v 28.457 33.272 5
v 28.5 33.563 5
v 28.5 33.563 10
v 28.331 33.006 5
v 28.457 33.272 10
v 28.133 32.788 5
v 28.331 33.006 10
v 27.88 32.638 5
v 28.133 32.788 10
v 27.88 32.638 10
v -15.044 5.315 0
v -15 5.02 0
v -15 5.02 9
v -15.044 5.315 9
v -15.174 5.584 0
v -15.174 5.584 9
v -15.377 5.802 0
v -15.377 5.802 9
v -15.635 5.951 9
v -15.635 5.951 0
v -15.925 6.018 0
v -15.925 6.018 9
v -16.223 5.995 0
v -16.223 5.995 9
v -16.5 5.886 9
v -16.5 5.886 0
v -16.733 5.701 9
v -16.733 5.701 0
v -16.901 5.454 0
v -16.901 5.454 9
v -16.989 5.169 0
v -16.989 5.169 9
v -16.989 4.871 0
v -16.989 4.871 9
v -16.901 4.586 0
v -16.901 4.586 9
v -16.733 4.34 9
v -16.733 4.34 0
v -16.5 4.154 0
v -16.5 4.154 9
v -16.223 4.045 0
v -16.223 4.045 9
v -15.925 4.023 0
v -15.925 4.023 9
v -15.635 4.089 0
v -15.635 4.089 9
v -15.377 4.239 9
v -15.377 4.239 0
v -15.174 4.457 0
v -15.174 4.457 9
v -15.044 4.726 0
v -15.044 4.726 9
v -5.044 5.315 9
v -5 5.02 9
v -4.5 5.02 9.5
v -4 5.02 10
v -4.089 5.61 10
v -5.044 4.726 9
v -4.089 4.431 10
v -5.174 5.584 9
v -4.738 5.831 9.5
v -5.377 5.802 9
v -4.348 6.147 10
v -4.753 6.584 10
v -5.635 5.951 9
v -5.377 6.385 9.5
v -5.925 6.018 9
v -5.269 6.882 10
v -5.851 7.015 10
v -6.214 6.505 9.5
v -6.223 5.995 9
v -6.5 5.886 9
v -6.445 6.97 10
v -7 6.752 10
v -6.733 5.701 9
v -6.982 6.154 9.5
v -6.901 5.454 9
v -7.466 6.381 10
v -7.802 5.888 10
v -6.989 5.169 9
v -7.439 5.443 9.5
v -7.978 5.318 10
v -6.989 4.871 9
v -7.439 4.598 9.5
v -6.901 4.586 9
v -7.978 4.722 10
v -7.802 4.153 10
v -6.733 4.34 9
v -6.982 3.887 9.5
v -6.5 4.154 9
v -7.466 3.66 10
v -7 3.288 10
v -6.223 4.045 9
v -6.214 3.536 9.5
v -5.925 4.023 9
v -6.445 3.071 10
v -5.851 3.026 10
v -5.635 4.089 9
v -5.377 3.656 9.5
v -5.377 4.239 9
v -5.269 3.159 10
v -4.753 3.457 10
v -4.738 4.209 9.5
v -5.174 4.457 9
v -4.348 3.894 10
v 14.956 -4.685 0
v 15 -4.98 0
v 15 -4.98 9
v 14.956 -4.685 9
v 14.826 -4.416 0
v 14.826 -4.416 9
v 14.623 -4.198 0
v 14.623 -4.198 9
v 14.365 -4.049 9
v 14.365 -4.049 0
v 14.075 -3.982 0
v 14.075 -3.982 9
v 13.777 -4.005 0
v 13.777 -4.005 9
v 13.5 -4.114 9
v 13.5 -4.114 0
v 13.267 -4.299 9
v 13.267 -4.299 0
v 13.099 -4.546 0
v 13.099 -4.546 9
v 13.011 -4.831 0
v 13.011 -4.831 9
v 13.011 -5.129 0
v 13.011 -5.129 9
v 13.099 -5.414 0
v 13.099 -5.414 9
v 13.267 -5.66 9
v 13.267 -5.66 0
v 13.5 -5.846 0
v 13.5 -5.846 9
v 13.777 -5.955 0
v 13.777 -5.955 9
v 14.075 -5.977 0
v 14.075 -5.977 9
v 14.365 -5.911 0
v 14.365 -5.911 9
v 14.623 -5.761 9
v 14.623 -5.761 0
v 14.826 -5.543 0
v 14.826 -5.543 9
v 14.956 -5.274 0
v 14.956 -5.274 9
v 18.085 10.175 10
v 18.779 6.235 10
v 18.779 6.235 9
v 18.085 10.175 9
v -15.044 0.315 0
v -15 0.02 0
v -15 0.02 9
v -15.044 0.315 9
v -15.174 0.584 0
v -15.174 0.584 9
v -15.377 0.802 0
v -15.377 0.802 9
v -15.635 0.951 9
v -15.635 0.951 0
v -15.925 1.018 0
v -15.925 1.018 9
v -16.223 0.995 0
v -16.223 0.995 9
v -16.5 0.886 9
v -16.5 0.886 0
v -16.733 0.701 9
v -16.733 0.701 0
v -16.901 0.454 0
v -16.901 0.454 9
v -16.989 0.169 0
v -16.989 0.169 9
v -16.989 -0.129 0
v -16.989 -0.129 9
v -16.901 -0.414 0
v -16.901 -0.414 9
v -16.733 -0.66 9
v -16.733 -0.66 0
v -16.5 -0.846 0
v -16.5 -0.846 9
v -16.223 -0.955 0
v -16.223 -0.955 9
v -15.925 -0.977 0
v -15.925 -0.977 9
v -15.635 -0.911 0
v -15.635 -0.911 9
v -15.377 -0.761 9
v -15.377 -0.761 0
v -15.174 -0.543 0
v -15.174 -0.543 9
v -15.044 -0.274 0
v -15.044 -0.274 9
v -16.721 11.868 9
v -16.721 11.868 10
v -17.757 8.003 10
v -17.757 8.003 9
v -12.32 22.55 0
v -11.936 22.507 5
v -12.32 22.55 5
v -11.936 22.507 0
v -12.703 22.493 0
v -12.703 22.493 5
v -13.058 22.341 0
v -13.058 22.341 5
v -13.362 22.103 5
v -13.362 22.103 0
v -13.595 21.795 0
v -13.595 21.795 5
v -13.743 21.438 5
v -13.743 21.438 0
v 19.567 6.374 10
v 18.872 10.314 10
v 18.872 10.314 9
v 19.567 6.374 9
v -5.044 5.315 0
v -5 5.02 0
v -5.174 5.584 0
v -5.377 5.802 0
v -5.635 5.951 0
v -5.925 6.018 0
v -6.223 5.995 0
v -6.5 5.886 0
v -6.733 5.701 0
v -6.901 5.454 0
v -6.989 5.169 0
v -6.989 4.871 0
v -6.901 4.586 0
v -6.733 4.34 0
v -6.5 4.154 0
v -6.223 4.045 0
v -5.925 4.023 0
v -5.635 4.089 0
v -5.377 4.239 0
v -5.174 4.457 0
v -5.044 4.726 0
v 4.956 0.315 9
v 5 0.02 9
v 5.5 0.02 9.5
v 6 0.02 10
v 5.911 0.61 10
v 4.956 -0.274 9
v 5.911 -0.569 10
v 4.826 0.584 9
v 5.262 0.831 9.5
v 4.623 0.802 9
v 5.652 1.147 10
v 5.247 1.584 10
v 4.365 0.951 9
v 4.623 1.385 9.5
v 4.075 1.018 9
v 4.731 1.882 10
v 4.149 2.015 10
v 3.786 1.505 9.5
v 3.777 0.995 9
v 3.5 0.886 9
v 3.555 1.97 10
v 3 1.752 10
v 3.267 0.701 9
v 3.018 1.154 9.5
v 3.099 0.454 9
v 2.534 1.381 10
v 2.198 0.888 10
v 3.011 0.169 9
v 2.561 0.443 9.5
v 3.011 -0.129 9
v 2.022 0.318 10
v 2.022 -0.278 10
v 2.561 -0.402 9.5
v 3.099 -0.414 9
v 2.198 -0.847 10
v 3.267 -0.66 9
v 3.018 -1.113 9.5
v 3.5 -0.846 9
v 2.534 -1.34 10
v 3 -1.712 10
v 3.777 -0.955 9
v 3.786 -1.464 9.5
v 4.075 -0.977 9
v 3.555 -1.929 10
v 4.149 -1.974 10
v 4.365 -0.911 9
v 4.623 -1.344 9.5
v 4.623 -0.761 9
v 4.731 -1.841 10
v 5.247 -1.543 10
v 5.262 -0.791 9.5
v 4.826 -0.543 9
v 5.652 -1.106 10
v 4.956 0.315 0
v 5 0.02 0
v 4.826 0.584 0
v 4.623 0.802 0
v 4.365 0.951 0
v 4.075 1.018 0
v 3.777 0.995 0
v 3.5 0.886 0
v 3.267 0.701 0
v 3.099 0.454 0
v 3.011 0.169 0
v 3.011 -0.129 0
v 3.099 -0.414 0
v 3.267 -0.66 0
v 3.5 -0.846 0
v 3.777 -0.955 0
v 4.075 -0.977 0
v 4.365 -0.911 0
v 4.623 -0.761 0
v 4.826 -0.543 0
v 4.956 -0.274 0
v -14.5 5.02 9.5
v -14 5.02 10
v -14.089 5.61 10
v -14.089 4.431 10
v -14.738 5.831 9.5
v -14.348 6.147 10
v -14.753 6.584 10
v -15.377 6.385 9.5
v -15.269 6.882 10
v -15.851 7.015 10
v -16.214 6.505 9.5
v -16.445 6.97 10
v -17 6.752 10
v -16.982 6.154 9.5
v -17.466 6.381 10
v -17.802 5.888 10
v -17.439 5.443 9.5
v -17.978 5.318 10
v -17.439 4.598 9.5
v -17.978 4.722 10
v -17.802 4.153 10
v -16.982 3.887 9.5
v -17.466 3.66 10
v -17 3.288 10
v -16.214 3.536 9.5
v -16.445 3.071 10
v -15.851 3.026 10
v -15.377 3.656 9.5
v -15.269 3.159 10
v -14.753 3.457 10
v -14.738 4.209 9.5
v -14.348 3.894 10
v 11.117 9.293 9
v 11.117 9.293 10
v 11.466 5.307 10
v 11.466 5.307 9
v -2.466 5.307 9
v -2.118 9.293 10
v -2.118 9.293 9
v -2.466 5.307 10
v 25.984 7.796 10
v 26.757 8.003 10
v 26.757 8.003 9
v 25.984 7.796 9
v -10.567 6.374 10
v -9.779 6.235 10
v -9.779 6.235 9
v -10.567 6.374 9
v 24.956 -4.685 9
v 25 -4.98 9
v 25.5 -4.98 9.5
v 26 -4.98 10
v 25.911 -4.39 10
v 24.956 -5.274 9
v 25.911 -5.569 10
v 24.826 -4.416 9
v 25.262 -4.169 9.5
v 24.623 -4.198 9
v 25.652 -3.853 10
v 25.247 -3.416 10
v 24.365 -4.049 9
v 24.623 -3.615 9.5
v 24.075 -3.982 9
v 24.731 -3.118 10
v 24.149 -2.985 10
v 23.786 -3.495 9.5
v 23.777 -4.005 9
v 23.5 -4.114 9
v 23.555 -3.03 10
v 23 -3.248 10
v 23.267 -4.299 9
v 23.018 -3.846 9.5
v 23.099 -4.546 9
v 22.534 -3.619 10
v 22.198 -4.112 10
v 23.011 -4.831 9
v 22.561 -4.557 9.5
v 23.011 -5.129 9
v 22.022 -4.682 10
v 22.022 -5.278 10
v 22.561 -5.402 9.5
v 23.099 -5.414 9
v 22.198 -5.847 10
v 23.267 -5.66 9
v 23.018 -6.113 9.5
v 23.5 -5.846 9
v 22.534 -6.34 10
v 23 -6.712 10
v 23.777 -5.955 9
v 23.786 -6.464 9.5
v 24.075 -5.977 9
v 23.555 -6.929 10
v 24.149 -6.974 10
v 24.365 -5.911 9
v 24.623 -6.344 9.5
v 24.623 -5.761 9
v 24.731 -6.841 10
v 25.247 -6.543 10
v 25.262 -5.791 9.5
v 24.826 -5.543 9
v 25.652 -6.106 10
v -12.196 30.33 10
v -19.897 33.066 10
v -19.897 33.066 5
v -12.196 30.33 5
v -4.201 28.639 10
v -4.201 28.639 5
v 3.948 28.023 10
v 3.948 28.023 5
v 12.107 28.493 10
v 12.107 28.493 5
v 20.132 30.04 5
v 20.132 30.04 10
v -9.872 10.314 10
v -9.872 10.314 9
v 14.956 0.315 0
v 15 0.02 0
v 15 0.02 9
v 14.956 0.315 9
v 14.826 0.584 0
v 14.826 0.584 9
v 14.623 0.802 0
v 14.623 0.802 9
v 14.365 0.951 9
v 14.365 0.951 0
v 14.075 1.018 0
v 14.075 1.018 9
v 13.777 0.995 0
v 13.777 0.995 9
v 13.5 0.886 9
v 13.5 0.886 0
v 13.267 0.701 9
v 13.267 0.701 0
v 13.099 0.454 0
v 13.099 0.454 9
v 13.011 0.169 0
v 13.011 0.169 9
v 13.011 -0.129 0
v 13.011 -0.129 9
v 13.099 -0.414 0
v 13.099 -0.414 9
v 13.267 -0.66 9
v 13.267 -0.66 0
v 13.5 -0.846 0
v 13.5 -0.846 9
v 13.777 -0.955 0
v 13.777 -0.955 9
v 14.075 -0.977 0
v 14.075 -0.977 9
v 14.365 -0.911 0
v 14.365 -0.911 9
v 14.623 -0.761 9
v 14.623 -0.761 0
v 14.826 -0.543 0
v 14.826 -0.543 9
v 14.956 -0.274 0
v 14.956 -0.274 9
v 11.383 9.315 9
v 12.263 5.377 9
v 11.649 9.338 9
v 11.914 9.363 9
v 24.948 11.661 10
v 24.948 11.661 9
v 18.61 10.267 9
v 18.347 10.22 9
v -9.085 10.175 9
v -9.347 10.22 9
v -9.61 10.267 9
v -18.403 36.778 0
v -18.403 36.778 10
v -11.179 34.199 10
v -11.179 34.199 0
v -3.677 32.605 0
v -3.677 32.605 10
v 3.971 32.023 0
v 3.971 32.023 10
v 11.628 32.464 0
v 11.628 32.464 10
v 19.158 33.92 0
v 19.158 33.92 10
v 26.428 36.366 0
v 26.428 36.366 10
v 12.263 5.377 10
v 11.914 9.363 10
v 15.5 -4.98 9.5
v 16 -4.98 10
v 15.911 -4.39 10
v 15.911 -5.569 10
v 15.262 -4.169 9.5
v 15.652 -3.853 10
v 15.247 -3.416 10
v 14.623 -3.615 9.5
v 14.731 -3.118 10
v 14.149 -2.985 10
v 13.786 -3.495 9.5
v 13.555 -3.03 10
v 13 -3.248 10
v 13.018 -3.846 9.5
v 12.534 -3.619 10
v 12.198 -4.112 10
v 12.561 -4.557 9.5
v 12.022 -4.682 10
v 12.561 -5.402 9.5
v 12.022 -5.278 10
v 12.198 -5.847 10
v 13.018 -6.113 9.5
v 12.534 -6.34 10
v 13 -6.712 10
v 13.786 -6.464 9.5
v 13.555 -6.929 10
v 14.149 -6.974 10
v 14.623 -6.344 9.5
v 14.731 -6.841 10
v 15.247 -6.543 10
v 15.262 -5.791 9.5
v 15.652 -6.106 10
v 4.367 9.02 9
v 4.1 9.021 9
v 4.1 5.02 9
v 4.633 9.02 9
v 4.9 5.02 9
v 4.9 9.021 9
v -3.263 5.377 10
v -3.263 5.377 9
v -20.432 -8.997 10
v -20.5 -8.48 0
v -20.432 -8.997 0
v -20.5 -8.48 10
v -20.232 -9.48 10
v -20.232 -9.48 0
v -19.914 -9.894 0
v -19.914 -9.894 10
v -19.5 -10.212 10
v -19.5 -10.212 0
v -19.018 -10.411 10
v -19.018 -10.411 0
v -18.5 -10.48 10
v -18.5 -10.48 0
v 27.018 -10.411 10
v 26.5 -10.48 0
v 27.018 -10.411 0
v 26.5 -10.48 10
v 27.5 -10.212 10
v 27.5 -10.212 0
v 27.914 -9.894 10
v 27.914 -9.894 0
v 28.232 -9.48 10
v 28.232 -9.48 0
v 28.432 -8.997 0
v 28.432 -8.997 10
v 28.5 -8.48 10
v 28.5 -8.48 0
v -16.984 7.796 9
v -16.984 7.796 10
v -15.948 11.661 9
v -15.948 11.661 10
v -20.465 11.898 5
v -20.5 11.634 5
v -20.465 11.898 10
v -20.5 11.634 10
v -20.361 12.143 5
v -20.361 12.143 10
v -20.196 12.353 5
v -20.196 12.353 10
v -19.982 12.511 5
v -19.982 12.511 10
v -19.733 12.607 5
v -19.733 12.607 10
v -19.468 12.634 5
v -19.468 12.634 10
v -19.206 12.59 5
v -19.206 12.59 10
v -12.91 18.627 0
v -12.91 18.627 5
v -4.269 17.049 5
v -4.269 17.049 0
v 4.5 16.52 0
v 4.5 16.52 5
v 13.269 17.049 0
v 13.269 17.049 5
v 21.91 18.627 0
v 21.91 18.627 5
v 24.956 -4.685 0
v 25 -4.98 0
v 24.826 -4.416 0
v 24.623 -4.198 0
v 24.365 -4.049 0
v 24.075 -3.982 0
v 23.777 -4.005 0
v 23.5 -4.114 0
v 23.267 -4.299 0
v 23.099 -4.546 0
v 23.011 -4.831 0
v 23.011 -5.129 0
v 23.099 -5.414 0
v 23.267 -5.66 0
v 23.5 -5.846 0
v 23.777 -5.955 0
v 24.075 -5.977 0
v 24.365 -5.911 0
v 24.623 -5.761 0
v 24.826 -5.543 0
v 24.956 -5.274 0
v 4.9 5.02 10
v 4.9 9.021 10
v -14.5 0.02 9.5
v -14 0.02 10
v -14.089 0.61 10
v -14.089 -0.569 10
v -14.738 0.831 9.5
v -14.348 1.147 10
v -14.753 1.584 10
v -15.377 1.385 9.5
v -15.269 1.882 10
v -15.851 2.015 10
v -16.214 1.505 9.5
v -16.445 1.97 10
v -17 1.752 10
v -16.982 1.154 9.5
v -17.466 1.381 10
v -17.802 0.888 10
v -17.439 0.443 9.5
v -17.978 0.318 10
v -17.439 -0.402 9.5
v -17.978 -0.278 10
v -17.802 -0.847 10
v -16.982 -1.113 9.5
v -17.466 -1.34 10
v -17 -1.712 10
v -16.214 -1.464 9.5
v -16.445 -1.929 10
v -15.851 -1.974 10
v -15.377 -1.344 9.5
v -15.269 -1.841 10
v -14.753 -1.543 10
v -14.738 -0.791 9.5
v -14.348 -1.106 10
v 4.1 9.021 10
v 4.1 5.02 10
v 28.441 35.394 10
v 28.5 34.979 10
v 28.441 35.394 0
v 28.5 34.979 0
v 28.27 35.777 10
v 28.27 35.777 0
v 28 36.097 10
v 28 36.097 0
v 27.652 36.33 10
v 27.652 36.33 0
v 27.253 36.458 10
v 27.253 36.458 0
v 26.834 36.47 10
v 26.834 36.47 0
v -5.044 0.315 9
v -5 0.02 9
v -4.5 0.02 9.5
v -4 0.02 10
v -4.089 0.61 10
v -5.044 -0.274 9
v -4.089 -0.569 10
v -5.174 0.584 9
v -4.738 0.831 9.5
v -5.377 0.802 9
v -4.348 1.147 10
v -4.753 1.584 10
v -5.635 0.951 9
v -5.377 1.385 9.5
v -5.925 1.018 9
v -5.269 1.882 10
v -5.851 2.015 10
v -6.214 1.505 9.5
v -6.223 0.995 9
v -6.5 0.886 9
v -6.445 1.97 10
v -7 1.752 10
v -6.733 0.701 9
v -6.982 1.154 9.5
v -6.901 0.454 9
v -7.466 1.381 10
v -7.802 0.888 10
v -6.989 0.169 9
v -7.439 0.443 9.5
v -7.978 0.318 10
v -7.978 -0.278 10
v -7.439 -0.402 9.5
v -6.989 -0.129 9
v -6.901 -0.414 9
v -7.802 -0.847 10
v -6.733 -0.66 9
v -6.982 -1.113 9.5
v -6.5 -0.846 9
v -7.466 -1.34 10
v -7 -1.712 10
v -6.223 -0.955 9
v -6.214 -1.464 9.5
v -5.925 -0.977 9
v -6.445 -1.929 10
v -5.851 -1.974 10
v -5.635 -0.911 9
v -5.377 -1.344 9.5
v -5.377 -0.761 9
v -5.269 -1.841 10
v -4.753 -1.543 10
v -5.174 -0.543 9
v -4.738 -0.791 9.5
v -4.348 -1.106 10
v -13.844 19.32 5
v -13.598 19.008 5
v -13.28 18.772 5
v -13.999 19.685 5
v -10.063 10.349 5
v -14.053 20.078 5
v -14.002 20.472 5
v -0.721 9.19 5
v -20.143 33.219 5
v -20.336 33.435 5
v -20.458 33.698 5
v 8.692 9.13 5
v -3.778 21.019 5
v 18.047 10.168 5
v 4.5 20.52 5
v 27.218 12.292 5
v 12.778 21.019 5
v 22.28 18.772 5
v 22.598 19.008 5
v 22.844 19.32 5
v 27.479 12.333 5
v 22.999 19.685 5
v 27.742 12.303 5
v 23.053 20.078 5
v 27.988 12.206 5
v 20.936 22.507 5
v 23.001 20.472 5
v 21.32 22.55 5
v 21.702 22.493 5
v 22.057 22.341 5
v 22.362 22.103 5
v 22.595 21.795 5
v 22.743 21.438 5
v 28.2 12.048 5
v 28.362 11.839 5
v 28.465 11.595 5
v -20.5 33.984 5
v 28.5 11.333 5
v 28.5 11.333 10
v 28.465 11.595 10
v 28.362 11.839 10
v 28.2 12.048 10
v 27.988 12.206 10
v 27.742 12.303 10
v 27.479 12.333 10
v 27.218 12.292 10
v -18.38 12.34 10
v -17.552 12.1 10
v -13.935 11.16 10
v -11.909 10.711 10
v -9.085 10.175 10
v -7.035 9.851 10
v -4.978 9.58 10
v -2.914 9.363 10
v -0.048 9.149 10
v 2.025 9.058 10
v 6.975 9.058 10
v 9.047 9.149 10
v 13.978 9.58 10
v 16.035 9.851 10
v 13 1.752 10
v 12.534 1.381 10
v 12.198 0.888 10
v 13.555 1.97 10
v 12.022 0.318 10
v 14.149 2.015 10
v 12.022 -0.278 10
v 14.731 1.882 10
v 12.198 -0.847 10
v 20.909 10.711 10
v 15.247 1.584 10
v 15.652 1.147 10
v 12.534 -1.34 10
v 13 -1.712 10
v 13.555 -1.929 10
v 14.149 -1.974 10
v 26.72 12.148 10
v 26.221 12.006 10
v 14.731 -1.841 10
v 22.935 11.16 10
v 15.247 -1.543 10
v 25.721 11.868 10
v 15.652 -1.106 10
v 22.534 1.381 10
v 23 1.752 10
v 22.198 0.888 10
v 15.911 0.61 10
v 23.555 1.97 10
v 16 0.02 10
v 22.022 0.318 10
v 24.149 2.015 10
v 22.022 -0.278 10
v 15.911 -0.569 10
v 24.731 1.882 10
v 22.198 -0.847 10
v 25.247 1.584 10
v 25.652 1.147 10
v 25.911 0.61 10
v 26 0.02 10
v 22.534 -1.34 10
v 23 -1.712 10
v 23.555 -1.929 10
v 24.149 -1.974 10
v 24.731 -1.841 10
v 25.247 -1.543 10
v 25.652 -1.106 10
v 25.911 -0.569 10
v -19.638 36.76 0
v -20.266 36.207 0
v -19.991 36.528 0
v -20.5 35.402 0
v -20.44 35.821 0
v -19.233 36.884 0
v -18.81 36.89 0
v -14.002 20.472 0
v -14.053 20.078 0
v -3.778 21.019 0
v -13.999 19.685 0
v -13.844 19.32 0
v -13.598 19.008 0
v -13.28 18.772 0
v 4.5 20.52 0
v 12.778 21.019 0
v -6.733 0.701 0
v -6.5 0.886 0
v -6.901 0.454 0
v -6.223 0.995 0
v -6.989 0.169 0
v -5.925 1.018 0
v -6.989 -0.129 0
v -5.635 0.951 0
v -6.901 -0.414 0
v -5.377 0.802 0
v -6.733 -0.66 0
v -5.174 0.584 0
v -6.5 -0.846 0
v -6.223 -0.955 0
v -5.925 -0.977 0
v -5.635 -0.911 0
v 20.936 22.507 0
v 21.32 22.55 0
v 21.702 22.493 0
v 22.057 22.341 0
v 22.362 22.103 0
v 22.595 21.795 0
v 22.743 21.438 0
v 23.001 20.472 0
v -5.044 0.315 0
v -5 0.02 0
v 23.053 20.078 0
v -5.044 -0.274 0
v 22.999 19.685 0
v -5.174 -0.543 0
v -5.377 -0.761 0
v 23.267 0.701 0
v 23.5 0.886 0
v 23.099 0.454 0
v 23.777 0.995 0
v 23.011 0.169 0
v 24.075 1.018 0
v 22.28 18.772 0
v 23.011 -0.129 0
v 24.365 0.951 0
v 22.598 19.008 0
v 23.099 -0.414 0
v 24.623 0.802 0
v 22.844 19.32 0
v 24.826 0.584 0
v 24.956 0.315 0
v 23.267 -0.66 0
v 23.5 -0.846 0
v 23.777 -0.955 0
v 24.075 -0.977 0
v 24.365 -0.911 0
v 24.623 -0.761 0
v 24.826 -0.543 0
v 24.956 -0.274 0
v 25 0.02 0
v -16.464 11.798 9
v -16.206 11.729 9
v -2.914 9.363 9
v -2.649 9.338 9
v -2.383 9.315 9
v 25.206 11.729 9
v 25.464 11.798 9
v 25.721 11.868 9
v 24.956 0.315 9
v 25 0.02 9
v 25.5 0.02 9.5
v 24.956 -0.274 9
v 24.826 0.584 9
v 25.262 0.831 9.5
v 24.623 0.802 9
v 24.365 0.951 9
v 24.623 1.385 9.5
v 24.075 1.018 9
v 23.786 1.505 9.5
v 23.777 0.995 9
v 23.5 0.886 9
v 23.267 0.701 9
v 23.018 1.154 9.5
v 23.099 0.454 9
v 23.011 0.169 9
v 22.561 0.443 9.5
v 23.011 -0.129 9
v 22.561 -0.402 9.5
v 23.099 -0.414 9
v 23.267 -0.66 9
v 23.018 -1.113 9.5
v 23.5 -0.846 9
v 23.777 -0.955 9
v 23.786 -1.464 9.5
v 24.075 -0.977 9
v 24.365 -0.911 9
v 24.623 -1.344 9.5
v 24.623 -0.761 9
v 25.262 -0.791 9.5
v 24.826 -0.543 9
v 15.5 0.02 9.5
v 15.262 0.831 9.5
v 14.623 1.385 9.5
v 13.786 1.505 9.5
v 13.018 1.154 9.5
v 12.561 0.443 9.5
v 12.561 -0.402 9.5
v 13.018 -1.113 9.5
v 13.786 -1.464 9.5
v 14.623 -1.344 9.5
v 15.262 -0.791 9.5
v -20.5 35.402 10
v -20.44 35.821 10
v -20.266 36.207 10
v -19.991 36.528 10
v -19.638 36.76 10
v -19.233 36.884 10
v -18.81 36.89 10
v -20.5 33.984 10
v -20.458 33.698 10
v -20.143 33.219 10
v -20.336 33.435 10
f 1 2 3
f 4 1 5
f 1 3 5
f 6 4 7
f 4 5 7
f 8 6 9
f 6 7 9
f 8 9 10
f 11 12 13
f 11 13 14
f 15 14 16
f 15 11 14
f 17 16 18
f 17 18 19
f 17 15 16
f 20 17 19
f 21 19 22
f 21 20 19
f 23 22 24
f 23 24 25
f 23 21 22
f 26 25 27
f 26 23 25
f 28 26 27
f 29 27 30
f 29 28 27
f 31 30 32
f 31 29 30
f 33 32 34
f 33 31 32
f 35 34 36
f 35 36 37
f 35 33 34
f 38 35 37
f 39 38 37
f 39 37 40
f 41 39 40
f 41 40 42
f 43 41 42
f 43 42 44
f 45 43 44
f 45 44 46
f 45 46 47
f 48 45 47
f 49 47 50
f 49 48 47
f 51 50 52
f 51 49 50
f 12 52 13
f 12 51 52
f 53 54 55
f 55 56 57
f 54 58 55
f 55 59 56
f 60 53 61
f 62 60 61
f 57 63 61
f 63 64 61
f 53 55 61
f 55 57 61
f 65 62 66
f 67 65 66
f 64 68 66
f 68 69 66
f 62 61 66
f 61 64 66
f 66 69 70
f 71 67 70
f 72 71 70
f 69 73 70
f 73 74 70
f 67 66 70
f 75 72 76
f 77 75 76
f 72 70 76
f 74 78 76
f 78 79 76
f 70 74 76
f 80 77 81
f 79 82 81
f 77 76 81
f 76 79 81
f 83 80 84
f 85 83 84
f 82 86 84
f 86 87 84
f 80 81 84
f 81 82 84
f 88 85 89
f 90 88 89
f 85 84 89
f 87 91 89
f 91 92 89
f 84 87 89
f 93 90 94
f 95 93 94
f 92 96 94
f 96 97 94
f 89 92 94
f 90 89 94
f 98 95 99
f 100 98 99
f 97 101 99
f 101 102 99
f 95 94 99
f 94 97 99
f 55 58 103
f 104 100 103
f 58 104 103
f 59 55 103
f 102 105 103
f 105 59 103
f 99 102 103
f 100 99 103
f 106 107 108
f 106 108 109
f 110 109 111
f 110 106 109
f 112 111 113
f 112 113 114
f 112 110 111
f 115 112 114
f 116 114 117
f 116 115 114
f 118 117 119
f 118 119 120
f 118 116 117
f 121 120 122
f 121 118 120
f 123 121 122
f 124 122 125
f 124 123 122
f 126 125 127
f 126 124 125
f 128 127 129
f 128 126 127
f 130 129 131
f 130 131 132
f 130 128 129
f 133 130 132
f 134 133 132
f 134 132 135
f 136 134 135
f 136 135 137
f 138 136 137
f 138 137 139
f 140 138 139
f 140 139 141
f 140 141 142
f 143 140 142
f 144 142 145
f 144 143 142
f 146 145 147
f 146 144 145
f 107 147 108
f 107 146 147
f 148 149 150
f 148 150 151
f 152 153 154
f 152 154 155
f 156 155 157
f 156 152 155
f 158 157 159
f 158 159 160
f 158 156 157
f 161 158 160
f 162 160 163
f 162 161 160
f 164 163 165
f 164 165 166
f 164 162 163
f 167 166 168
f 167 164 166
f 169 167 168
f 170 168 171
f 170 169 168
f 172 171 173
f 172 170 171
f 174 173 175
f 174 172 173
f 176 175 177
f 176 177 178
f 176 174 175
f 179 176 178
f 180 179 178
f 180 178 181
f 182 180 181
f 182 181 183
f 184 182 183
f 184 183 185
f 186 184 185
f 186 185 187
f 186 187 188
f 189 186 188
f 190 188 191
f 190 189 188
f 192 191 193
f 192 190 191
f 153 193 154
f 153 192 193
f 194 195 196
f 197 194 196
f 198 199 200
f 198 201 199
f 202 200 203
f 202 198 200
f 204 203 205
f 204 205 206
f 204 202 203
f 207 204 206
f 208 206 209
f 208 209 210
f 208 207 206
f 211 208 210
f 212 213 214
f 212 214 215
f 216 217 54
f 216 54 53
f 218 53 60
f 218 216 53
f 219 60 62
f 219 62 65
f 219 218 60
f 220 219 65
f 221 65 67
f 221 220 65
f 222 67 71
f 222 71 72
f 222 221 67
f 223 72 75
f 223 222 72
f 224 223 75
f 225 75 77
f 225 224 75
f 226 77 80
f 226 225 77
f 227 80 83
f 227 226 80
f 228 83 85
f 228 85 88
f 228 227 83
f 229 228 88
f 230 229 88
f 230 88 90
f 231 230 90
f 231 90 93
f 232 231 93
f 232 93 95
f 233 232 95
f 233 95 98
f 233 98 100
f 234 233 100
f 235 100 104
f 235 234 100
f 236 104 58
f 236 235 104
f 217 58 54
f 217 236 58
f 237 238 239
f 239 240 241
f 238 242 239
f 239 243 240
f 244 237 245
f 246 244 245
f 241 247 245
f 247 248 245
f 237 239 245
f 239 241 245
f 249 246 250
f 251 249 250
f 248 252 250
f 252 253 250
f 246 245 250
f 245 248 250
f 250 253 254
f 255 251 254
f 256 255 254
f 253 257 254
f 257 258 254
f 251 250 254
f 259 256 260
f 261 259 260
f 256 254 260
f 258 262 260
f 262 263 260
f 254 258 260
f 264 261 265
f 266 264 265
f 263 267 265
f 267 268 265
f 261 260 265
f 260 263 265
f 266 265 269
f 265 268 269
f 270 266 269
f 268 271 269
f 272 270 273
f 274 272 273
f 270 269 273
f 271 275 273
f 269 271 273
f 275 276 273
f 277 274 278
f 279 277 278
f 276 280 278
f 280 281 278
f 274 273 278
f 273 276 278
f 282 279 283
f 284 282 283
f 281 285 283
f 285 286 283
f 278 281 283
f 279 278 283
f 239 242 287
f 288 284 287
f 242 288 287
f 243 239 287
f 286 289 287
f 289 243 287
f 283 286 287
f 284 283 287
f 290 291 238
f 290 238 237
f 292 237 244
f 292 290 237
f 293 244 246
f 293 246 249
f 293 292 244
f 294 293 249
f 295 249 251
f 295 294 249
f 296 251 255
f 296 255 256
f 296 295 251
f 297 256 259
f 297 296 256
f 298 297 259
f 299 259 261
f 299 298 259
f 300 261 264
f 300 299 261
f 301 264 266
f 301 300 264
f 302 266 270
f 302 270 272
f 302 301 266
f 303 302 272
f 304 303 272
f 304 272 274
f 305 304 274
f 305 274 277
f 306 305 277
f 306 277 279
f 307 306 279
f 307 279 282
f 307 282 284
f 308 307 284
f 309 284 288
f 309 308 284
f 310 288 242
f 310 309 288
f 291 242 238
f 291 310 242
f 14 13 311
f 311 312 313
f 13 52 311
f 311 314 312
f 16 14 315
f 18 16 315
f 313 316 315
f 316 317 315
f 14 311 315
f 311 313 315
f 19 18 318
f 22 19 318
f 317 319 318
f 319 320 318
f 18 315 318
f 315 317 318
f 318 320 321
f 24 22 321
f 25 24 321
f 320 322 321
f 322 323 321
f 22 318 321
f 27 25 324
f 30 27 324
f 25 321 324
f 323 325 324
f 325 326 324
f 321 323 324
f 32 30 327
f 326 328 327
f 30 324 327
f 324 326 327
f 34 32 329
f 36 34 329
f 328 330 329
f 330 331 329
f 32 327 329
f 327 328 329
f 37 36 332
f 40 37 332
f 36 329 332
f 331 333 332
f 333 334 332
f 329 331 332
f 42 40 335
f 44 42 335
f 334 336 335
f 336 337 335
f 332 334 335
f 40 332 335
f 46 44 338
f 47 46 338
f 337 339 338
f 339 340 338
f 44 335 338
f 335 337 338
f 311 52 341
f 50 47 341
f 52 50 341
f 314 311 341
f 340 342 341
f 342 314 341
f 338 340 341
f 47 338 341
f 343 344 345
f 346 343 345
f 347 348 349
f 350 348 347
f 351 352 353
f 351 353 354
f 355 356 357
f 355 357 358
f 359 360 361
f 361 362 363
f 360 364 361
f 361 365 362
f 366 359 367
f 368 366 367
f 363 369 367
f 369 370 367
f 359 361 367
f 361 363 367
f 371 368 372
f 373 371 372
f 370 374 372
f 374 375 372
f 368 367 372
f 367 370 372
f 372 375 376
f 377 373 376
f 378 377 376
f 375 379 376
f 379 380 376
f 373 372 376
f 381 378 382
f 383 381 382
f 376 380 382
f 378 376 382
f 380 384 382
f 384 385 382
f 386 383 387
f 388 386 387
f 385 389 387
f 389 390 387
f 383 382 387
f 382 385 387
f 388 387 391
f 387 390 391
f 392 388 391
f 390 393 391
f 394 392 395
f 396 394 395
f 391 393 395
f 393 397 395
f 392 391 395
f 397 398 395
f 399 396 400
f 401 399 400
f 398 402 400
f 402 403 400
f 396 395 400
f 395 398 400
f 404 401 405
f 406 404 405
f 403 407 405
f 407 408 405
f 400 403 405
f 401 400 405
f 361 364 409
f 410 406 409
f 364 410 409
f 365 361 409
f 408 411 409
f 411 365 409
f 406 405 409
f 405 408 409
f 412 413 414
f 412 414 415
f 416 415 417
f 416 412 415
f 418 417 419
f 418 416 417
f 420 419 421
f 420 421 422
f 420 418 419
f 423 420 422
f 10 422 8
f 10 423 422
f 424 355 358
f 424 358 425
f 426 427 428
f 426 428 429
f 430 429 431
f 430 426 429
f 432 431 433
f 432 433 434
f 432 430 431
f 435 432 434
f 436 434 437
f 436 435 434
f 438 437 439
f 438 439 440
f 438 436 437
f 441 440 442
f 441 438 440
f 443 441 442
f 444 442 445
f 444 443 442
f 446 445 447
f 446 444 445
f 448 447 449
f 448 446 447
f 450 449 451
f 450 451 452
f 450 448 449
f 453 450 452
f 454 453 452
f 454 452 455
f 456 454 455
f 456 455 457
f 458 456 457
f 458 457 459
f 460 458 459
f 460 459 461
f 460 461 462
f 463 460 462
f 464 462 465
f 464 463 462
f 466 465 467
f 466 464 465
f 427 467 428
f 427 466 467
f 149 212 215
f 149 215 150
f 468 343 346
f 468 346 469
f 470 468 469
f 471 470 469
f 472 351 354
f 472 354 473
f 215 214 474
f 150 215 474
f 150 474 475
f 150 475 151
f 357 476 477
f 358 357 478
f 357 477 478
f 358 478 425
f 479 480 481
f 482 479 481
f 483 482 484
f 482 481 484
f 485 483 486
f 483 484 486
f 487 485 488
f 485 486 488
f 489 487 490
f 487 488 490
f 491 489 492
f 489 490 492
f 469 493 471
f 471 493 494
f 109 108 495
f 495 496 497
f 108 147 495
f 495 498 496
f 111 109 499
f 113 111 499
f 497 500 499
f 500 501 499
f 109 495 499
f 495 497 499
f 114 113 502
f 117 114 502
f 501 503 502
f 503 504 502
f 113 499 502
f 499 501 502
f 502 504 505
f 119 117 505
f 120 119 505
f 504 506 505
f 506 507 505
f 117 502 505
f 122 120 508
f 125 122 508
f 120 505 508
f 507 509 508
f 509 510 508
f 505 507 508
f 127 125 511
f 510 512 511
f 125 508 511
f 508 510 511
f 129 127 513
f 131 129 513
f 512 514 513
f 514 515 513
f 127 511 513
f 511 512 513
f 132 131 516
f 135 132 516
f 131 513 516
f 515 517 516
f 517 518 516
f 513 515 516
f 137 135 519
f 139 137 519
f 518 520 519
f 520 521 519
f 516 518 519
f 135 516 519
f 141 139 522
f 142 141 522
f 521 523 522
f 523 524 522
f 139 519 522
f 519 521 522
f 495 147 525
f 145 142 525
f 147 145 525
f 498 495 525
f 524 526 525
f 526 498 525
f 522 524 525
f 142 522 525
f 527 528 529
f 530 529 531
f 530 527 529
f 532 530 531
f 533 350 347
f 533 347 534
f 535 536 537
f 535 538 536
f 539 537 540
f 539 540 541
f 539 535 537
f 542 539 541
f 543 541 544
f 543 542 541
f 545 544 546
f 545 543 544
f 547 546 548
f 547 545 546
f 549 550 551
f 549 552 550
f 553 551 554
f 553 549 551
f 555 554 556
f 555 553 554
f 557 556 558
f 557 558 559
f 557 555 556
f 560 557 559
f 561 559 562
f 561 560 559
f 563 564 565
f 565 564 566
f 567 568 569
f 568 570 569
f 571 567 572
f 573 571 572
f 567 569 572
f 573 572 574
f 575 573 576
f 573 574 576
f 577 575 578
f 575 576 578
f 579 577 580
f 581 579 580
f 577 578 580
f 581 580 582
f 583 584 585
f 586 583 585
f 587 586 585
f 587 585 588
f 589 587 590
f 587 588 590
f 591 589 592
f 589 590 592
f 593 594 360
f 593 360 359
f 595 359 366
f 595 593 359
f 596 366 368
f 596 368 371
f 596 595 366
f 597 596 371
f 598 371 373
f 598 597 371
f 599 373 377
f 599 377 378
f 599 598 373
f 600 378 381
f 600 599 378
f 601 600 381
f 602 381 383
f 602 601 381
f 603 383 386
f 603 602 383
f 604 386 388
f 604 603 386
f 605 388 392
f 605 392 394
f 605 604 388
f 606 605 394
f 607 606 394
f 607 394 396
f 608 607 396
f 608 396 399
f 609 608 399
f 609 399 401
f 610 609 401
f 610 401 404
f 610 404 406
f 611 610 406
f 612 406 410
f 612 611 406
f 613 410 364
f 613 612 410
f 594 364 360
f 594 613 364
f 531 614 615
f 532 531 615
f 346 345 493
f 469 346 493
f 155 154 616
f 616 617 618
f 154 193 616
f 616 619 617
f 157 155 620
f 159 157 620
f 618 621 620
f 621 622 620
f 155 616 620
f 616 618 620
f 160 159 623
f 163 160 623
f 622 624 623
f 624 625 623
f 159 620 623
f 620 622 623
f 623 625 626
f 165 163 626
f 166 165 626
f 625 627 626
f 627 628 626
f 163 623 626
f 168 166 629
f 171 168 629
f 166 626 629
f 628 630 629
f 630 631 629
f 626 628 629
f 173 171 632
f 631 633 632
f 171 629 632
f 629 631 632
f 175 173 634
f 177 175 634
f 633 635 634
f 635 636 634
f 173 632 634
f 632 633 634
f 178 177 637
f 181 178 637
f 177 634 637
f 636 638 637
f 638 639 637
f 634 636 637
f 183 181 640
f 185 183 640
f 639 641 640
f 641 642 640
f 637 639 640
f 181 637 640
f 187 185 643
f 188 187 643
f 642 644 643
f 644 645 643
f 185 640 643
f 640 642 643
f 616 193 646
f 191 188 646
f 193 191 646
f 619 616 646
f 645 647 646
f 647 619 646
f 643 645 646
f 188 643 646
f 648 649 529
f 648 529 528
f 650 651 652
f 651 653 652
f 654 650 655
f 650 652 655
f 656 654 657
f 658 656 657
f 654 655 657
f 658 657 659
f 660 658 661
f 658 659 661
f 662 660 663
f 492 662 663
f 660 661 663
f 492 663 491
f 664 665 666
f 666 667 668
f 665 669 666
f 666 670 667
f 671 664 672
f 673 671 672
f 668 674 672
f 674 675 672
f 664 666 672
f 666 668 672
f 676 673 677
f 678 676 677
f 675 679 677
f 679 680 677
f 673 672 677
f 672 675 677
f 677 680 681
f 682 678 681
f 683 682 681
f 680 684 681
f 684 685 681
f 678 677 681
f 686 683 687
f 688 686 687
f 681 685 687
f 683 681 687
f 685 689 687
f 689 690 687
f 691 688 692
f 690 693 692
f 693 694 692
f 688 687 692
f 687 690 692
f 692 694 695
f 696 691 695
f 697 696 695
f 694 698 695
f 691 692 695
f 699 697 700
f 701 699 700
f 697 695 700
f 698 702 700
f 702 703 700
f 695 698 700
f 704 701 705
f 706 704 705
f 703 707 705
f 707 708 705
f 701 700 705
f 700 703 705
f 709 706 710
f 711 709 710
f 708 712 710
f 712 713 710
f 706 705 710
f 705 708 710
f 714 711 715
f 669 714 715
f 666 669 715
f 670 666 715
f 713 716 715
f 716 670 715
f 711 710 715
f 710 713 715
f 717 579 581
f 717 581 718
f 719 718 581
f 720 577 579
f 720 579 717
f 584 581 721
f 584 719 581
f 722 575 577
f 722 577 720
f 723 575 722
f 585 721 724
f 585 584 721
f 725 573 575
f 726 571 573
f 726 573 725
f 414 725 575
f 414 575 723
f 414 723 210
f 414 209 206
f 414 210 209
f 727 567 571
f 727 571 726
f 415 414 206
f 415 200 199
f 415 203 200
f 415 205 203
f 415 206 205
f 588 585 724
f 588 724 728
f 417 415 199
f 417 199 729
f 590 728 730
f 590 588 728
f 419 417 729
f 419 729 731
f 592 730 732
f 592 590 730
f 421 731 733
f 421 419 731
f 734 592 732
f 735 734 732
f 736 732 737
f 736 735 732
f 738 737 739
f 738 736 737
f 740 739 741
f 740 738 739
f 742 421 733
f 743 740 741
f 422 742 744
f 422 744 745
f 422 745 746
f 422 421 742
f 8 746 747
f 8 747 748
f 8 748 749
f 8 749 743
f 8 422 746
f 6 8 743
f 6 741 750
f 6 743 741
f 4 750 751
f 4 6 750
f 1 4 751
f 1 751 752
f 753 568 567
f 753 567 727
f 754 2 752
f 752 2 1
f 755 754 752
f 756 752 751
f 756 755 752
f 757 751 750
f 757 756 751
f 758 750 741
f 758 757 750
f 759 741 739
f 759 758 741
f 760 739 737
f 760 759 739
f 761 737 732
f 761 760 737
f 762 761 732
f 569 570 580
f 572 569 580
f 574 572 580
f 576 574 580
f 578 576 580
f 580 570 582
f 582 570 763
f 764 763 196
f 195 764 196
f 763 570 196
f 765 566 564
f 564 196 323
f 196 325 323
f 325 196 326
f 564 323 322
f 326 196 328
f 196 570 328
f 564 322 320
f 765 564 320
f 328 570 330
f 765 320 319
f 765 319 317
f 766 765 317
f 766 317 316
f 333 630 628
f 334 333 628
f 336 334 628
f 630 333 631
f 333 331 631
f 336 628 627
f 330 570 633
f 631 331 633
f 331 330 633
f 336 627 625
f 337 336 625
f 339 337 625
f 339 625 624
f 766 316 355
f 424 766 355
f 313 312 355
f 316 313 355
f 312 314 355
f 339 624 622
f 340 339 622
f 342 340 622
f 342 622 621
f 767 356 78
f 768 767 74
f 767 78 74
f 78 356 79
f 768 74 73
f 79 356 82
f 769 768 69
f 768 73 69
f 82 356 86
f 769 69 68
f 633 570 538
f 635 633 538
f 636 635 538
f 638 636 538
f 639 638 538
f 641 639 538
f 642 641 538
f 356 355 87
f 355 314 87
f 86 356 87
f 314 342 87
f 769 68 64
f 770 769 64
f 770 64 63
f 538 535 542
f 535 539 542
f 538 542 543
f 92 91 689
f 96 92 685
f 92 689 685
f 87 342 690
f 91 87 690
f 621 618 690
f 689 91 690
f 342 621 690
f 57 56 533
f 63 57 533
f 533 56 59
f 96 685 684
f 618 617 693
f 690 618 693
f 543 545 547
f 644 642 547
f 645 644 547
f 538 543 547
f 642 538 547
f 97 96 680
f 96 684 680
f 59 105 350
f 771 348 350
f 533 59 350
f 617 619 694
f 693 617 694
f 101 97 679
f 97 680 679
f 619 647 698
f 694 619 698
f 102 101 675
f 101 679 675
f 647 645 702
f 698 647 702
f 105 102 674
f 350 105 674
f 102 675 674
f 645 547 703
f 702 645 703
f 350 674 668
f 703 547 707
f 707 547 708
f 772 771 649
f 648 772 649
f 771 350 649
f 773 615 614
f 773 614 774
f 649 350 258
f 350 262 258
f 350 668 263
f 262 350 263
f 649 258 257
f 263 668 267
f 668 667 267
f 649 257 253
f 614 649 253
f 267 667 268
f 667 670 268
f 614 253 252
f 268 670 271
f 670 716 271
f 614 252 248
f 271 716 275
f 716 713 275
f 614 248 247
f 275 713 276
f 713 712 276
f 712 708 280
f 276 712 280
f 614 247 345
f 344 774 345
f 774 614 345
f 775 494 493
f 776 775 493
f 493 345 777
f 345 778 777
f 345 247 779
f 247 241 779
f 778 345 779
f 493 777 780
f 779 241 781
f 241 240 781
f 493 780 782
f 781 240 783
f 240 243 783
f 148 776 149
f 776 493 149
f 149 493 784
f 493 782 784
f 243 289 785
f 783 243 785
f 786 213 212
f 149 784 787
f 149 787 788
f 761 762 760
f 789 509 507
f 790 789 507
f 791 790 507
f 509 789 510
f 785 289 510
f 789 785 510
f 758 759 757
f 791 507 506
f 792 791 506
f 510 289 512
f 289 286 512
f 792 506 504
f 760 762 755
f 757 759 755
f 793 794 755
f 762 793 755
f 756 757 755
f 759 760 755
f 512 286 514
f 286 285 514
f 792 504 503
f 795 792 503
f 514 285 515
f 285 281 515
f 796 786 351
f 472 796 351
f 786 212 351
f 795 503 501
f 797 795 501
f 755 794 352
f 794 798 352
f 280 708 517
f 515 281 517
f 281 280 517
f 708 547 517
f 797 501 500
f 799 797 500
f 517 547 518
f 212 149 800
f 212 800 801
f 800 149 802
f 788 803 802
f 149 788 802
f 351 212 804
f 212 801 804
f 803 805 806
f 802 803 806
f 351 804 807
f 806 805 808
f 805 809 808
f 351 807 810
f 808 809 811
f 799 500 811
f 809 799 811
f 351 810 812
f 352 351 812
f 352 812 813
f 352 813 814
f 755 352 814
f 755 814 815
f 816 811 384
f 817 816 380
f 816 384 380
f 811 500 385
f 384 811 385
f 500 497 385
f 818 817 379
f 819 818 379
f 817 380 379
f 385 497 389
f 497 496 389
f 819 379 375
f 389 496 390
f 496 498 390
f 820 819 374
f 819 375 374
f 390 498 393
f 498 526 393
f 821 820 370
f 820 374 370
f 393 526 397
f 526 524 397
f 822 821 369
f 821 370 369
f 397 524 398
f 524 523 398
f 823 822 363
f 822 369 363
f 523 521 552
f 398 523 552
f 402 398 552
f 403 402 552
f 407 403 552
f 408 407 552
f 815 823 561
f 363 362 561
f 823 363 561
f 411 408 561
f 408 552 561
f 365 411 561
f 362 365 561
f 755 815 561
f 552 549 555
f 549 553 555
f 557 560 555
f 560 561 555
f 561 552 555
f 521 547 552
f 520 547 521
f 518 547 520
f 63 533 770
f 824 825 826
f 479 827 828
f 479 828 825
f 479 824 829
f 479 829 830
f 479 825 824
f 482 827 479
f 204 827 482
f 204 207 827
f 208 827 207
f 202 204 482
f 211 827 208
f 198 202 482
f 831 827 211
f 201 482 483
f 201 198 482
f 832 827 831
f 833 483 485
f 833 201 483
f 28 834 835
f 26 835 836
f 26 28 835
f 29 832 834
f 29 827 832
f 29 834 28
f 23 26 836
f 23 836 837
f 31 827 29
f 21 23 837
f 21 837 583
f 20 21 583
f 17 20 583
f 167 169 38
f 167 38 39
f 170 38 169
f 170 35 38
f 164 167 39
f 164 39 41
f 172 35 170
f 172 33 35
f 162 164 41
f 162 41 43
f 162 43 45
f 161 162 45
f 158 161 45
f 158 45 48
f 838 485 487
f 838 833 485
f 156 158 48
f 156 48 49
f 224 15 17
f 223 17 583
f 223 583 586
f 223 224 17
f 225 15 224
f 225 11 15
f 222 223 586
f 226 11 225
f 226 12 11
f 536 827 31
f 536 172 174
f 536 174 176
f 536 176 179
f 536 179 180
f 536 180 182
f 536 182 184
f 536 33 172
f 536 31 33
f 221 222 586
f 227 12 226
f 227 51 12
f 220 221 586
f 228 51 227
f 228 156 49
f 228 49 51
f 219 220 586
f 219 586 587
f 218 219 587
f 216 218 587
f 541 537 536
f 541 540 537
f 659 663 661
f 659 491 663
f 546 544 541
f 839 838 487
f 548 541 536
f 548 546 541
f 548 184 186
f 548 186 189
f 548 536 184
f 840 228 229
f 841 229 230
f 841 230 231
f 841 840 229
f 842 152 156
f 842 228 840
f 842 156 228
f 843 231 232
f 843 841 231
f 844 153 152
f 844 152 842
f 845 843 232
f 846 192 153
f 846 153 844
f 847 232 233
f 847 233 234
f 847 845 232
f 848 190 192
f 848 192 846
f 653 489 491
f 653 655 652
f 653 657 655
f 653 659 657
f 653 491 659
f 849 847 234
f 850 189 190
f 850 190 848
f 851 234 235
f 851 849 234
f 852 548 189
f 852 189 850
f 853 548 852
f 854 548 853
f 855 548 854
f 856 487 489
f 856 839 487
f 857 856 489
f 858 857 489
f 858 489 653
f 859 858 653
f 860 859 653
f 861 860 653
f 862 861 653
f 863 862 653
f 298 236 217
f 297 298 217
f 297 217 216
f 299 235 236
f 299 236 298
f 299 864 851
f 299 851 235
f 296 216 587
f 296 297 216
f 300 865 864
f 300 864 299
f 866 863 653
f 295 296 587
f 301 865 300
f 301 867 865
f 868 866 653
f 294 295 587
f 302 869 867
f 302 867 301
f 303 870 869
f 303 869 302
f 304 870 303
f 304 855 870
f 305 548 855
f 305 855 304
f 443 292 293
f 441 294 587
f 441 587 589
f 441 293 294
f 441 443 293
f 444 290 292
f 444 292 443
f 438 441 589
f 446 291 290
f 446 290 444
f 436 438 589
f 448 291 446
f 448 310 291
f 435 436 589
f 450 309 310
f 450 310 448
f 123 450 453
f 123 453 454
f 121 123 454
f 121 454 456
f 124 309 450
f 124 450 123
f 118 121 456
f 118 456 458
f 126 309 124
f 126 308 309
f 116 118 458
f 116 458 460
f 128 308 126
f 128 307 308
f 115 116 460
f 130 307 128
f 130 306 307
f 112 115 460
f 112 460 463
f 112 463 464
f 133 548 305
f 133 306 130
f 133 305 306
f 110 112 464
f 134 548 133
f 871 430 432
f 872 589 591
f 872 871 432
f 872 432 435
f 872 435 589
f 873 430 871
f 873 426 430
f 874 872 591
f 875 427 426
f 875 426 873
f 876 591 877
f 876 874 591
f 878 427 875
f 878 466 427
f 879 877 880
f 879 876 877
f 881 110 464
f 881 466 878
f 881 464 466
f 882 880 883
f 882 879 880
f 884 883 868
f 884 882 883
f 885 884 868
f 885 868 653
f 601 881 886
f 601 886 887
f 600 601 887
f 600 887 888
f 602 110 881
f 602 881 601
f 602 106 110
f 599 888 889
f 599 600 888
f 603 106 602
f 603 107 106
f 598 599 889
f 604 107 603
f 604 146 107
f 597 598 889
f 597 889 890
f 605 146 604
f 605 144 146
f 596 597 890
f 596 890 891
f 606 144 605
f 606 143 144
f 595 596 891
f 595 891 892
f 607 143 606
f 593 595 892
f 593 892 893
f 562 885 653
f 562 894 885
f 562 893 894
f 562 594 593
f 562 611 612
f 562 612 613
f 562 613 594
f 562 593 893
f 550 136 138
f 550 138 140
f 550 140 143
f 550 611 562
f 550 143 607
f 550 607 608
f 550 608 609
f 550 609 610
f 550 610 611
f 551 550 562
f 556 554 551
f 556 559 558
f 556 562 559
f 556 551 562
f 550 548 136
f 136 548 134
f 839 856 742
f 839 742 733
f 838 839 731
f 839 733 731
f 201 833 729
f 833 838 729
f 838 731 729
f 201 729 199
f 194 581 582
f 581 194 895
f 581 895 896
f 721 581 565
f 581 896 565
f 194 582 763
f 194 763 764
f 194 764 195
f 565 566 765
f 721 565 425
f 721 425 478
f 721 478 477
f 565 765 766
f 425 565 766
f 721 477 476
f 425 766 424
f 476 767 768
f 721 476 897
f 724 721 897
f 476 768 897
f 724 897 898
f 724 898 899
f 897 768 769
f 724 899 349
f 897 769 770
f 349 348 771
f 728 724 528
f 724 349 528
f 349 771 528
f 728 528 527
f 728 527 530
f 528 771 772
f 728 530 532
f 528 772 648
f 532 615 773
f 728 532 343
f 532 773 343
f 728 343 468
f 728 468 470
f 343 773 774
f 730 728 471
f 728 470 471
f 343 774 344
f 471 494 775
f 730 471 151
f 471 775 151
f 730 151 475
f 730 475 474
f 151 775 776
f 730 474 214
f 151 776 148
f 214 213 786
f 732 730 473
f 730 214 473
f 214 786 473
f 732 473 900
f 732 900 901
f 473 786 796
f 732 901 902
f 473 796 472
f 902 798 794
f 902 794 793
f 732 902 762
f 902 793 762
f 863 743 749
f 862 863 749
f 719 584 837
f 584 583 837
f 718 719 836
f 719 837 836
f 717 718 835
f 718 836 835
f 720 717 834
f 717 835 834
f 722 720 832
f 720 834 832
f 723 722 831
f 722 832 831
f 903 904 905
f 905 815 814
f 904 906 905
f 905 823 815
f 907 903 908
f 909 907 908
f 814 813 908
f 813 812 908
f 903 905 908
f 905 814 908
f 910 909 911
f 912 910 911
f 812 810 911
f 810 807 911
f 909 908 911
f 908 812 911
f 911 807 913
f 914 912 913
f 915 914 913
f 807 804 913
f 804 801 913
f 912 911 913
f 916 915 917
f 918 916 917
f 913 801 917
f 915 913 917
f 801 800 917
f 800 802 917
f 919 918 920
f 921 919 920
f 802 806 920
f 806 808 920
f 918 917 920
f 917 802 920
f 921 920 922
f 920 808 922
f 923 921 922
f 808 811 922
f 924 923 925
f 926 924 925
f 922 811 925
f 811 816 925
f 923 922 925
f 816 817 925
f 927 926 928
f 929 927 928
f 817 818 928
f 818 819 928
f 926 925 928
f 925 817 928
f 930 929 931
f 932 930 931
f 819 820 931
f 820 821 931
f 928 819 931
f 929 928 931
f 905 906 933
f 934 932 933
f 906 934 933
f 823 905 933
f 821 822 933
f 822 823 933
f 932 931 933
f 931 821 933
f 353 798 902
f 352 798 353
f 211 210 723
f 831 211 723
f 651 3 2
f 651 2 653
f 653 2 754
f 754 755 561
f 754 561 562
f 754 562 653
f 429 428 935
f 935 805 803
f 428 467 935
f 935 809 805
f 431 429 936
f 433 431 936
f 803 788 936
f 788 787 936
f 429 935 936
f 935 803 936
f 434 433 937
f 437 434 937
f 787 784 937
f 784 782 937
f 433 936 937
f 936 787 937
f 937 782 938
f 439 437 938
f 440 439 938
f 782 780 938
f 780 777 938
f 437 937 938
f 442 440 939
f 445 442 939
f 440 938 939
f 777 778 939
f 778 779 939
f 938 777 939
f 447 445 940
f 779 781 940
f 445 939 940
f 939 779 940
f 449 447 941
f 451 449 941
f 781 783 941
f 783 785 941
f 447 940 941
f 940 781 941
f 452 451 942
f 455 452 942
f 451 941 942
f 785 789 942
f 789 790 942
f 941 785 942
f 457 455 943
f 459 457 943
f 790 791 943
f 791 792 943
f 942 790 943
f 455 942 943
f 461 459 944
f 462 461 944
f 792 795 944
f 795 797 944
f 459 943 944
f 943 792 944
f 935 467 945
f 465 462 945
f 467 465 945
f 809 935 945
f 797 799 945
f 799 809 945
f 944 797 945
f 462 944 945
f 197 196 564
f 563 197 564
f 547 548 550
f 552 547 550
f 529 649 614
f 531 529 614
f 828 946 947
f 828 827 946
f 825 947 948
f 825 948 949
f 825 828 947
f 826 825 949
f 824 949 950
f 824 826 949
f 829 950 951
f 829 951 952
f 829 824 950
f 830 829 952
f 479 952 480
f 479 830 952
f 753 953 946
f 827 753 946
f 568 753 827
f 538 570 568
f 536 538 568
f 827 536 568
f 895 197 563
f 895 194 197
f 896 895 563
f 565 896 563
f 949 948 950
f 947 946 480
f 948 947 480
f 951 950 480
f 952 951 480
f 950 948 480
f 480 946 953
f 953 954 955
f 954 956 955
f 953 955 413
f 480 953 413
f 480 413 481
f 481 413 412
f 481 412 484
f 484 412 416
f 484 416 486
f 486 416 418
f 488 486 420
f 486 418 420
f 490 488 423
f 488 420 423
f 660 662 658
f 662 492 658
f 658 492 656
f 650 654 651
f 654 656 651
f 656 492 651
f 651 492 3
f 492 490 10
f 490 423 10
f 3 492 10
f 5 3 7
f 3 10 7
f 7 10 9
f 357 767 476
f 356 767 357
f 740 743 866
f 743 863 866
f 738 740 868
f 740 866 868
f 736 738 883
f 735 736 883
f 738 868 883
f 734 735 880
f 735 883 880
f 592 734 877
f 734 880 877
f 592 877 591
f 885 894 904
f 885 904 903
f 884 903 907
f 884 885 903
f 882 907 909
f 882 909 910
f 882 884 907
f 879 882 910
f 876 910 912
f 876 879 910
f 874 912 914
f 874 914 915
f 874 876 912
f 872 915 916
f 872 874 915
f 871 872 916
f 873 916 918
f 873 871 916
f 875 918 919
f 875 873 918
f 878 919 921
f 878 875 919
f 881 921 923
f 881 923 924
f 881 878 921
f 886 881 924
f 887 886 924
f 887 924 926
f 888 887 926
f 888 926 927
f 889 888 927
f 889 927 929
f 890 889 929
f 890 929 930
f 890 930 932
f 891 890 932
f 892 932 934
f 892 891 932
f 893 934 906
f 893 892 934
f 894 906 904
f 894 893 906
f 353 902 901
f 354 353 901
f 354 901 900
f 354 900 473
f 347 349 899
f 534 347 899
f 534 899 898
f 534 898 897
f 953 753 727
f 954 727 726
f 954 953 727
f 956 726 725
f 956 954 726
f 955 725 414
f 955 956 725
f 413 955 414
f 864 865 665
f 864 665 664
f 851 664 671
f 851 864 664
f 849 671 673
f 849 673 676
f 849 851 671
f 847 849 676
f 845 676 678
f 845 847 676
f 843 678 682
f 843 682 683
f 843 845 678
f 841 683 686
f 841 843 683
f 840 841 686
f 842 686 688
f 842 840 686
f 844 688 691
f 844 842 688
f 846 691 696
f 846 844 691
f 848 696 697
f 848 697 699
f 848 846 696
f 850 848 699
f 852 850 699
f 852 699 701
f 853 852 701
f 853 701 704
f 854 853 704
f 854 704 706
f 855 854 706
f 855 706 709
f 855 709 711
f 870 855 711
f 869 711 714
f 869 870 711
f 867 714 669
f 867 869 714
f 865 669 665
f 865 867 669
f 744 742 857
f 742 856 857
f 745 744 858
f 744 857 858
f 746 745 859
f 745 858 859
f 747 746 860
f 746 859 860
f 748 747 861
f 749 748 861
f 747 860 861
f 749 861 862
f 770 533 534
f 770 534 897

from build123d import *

# Parameters (mm, degrees)
SKETCH1_W           = 49
SKETCH1_H           = 21
SKETCH1_R           = 1
BOSS_EXTRUDE4_DEPTH = 10
CHAMFER2_SIZE       = 1
FILLET2_R           = 2
SKETCH2_W           = 49
SKETCH2_H           = 10
BOSS_EXTRUDE5_DEPTH = 30
CUT_EXTRUDE1_DEPTH  = 73
CUT_EXTRUDE2_DEPTH  = 5
SKETCH4_4_W         = 0.8
SKETCH4_4_H         = 8
CUT_EXTRUDE3_DEPTH  = 1
FILLET4_R           = 1.5
FILLET6_R           = 1.5
FILLET7_R           = 1


with BuildPart() as part:
    # Sketch1 → Boss-Extrude4 (new body)
    with BuildSketch(Plane.XY):
        with Locations((3.999954481, 0.020373254)):
            Rectangle(SKETCH1_W, SKETCH1_H)
        with Locations((-16.000045519, 0.020373254)):
            Circle(SKETCH1_R, mode=Mode.SUBTRACT)
        with Locations((-6.000045519, 0.020373254)):
            Circle(SKETCH1_R, mode=Mode.SUBTRACT)
        with Locations((13.999954481, -4.979626746)):
            Circle(SKETCH1_R, mode=Mode.SUBTRACT)
        with Locations((23.999954481, -4.979626746)):
            Circle(SKETCH1_R, mode=Mode.SUBTRACT)
        with Locations((-16.000045519, 5.020373254)):
            Circle(SKETCH1_R, mode=Mode.SUBTRACT)
        with Locations((3.999954481, 0.020373254)):
            Circle(SKETCH1_R, mode=Mode.SUBTRACT)
        with Locations((-6.000045519, 5.020373254)):
            Circle(SKETCH1_R, mode=Mode.SUBTRACT)
        with Locations((13.999954481, 0.020373254)):
            Circle(SKETCH1_R, mode=Mode.SUBTRACT)
        with Locations((23.999954481, 0.020373254)):
            Circle(SKETCH1_R, mode=Mode.SUBTRACT)
    extrude(amount=BOSS_EXTRUDE4_DEPTH)

    # Chamfer2
    chamfer2_edges = [part.edges().sort_by_distance(p)[0] for p in [
        (-17.000045519, 0.020373254, 10),
        (-17.000045519, 5.020373254, 10),
        (-7.000045519, 5.020373254, 10),
        (-7.000045519, 0.020373254, 10),
        (2.999954481, 0.020373254, 10),
        (22.999954481, 0.020373254, 10),
        (12.999954481, 0.020373254, 10),
        (12.999954481, -4.979626746, 10),
        (22.999954481, -4.979626746, 10),
    ]]
    chamfer(chamfer2_edges, length=CHAMFER2_SIZE)

    # Fillet2
    fillet2_edges = [part.edges().sort_by_distance(p)[0] for p in [
        (-20.500045519, -10.479626746, 5),
        (28.499954481, -10.479626746, 5),
    ]]
    fillet(fillet2_edges, radius=FILLET2_R)

    # Sketch2 → Boss-Extrude5 (add)
    with BuildSketch(Plane(origin=(0, 10.520373254, 0), x_dir=(1, 0, 0), z_dir=(0, 1, 0))):
        with Locations((3.999954481, -5)):
            Rectangle(SKETCH2_W, SKETCH2_H)
    extrude(amount=BOSS_EXTRUDE5_DEPTH)

    # Sketch4 → Cut-Extrude1 (cut)
    with BuildSketch(Plane.XY.offset(10)):
        with BuildLine():
            ThreePointArc((22.358468593, 22.87149124), (4.499954481, 20.520373254), (-13.358559631, 22.87149124))
            Line((-13.358559631, 22.87149124), (-14.393835812, 19.007787935))
            ThreePointArc((-14.393835812, 19.007787935), (4.499954481, 16.520373254), (23.393744773, 19.007787935))
            Line((23.393744773, 19.007787935), (22.358468593, 22.87149124))
        make_face()
        with BuildLine():
            Line((-20.500045519, 40.520373254), (-20.500045519, 37.739585311))
            ThreePointArc((-20.500045519, 37.739585311), (3.947268557, 32.023029505), (28.499954481, 37.268579027))
            Line((28.499954481, 37.268579027), (28.499954481, 40.520373254))
            Line((28.499954481, 40.520373254), (-20.500045519, 40.520373254))
        make_face()
    extrude(amount=-CUT_EXTRUDE1_DEPTH, mode=Mode.SUBTRACT)

    # Sketch4<3> → Cut-Extrude2 (cut)
    with BuildSketch(Plane.XY.offset(10)):
        with BuildLine():
            Line((-20.500045519, 33.33096144), (-20.500045519, 13.000767923))
            ThreePointArc((-20.500045519, 13.000767923), (3.975052557, 9.022084589), (28.499954481, 12.681255612))
            Line((28.499954481, 12.681255612), (28.499954481, 32.89661499))
            ThreePointArc((28.499954481, 32.89661499), (3.95482678, 28.022789271), (-20.500045519, 33.33096144))
        make_face()
        with BuildLine():
            ThreePointArc((-13.358559631, 22.87149124), (4.499954481, 20.520373254), (22.358468593, 22.87149124))
            Line((22.358468593, 22.87149124), (23.393744773, 19.007787935))
            ThreePointArc((23.393744773, 19.007787935), (4.499954481, 16.520373254), (-14.393835812, 19.007787935))
            Line((-14.393835812, 19.007787935), (-13.358559631, 22.87149124))
        make_face(mode=Mode.SUBTRACT)
    extrude(amount=-CUT_EXTRUDE2_DEPTH, mode=Mode.SUBTRACT)

    # Sketch4<4> → Cut-Extrude3 (cut)
    with BuildSketch(Plane.XY.offset(10)):
        Polygon((-1.76898196, 13.276616553), (-2.565937719, 13.346341147), (-3.26318366, 5.376783563), (-2.466227902, 5.307058968), align=None)
        with Locations((4.499954481, 9.020373254)):
            Rectangle(SKETCH4_4_W, SKETCH4_4_H)
        Polygon((-9.178054212, 14.25203942), (-10.567239633, 6.373577396), (-9.779393431, 6.234658854), (-8.390208009, 14.113120878), align=None)
        Polygon((12.263092622, 5.376783563), (11.56584668, 13.346341147), (10.768890922, 13.276616553), (11.466136864, 5.307058968), align=None)
        Polygon((-15.6860728, 15.730575161), (-17.756625161, 8.003168551), (-16.9838845, 7.796113315), (-14.913332139, 15.523519925), align=None)
        Polygon((19.567148595, 6.373577396), (18.177963174, 14.25203942), (17.390116971, 14.113120878), (18.779302393, 6.234658854), align=None)
        Polygon((23.913241101, 15.523519925), (25.983793462, 7.796113315), (26.756534123, 8.003168551), (24.685981762, 15.730575161), align=None)
    extrude(amount=-CUT_EXTRUDE3_DEPTH, mode=Mode.SUBTRACT)

    # Fillet4
    fillet4_edges = [part.edges().sort_by_distance(p)[0] for p in [
        (-14.393835812, 19.007787935, 2.5),
        (-13.358559631, 22.87149124, 2.5),
        (22.358468593, 22.87149124, 2.5),
        (23.393744773, 19.007787935, 2.5),
    ]]
    fillet(fillet4_edges, radius=FILLET4_R)

    # Fillet6
    fillet6_edges = [part.edges().sort_by_distance(p)[0] for p in [
        (-20.500045519, 37.739585311, 5),
        (28.499954481, 37.268579027, 5),
    ]]
    fillet(fillet6_edges, radius=FILLET6_R)

    # Fillet7
    fillet7_edges = [part.edges().sort_by_distance(p)[0] for p in [
        (28.499954481, 12.681255612, 7.5),
        (-20.500045519, 13.000767923, 7.5),
        (-20.500045519, 33.33096144, 7.5),
        (28.499954481, 32.89661499, 7.5),
    ]]
    fillet(fillet7_edges, radius=FILLET7_R)


solid = part.part
